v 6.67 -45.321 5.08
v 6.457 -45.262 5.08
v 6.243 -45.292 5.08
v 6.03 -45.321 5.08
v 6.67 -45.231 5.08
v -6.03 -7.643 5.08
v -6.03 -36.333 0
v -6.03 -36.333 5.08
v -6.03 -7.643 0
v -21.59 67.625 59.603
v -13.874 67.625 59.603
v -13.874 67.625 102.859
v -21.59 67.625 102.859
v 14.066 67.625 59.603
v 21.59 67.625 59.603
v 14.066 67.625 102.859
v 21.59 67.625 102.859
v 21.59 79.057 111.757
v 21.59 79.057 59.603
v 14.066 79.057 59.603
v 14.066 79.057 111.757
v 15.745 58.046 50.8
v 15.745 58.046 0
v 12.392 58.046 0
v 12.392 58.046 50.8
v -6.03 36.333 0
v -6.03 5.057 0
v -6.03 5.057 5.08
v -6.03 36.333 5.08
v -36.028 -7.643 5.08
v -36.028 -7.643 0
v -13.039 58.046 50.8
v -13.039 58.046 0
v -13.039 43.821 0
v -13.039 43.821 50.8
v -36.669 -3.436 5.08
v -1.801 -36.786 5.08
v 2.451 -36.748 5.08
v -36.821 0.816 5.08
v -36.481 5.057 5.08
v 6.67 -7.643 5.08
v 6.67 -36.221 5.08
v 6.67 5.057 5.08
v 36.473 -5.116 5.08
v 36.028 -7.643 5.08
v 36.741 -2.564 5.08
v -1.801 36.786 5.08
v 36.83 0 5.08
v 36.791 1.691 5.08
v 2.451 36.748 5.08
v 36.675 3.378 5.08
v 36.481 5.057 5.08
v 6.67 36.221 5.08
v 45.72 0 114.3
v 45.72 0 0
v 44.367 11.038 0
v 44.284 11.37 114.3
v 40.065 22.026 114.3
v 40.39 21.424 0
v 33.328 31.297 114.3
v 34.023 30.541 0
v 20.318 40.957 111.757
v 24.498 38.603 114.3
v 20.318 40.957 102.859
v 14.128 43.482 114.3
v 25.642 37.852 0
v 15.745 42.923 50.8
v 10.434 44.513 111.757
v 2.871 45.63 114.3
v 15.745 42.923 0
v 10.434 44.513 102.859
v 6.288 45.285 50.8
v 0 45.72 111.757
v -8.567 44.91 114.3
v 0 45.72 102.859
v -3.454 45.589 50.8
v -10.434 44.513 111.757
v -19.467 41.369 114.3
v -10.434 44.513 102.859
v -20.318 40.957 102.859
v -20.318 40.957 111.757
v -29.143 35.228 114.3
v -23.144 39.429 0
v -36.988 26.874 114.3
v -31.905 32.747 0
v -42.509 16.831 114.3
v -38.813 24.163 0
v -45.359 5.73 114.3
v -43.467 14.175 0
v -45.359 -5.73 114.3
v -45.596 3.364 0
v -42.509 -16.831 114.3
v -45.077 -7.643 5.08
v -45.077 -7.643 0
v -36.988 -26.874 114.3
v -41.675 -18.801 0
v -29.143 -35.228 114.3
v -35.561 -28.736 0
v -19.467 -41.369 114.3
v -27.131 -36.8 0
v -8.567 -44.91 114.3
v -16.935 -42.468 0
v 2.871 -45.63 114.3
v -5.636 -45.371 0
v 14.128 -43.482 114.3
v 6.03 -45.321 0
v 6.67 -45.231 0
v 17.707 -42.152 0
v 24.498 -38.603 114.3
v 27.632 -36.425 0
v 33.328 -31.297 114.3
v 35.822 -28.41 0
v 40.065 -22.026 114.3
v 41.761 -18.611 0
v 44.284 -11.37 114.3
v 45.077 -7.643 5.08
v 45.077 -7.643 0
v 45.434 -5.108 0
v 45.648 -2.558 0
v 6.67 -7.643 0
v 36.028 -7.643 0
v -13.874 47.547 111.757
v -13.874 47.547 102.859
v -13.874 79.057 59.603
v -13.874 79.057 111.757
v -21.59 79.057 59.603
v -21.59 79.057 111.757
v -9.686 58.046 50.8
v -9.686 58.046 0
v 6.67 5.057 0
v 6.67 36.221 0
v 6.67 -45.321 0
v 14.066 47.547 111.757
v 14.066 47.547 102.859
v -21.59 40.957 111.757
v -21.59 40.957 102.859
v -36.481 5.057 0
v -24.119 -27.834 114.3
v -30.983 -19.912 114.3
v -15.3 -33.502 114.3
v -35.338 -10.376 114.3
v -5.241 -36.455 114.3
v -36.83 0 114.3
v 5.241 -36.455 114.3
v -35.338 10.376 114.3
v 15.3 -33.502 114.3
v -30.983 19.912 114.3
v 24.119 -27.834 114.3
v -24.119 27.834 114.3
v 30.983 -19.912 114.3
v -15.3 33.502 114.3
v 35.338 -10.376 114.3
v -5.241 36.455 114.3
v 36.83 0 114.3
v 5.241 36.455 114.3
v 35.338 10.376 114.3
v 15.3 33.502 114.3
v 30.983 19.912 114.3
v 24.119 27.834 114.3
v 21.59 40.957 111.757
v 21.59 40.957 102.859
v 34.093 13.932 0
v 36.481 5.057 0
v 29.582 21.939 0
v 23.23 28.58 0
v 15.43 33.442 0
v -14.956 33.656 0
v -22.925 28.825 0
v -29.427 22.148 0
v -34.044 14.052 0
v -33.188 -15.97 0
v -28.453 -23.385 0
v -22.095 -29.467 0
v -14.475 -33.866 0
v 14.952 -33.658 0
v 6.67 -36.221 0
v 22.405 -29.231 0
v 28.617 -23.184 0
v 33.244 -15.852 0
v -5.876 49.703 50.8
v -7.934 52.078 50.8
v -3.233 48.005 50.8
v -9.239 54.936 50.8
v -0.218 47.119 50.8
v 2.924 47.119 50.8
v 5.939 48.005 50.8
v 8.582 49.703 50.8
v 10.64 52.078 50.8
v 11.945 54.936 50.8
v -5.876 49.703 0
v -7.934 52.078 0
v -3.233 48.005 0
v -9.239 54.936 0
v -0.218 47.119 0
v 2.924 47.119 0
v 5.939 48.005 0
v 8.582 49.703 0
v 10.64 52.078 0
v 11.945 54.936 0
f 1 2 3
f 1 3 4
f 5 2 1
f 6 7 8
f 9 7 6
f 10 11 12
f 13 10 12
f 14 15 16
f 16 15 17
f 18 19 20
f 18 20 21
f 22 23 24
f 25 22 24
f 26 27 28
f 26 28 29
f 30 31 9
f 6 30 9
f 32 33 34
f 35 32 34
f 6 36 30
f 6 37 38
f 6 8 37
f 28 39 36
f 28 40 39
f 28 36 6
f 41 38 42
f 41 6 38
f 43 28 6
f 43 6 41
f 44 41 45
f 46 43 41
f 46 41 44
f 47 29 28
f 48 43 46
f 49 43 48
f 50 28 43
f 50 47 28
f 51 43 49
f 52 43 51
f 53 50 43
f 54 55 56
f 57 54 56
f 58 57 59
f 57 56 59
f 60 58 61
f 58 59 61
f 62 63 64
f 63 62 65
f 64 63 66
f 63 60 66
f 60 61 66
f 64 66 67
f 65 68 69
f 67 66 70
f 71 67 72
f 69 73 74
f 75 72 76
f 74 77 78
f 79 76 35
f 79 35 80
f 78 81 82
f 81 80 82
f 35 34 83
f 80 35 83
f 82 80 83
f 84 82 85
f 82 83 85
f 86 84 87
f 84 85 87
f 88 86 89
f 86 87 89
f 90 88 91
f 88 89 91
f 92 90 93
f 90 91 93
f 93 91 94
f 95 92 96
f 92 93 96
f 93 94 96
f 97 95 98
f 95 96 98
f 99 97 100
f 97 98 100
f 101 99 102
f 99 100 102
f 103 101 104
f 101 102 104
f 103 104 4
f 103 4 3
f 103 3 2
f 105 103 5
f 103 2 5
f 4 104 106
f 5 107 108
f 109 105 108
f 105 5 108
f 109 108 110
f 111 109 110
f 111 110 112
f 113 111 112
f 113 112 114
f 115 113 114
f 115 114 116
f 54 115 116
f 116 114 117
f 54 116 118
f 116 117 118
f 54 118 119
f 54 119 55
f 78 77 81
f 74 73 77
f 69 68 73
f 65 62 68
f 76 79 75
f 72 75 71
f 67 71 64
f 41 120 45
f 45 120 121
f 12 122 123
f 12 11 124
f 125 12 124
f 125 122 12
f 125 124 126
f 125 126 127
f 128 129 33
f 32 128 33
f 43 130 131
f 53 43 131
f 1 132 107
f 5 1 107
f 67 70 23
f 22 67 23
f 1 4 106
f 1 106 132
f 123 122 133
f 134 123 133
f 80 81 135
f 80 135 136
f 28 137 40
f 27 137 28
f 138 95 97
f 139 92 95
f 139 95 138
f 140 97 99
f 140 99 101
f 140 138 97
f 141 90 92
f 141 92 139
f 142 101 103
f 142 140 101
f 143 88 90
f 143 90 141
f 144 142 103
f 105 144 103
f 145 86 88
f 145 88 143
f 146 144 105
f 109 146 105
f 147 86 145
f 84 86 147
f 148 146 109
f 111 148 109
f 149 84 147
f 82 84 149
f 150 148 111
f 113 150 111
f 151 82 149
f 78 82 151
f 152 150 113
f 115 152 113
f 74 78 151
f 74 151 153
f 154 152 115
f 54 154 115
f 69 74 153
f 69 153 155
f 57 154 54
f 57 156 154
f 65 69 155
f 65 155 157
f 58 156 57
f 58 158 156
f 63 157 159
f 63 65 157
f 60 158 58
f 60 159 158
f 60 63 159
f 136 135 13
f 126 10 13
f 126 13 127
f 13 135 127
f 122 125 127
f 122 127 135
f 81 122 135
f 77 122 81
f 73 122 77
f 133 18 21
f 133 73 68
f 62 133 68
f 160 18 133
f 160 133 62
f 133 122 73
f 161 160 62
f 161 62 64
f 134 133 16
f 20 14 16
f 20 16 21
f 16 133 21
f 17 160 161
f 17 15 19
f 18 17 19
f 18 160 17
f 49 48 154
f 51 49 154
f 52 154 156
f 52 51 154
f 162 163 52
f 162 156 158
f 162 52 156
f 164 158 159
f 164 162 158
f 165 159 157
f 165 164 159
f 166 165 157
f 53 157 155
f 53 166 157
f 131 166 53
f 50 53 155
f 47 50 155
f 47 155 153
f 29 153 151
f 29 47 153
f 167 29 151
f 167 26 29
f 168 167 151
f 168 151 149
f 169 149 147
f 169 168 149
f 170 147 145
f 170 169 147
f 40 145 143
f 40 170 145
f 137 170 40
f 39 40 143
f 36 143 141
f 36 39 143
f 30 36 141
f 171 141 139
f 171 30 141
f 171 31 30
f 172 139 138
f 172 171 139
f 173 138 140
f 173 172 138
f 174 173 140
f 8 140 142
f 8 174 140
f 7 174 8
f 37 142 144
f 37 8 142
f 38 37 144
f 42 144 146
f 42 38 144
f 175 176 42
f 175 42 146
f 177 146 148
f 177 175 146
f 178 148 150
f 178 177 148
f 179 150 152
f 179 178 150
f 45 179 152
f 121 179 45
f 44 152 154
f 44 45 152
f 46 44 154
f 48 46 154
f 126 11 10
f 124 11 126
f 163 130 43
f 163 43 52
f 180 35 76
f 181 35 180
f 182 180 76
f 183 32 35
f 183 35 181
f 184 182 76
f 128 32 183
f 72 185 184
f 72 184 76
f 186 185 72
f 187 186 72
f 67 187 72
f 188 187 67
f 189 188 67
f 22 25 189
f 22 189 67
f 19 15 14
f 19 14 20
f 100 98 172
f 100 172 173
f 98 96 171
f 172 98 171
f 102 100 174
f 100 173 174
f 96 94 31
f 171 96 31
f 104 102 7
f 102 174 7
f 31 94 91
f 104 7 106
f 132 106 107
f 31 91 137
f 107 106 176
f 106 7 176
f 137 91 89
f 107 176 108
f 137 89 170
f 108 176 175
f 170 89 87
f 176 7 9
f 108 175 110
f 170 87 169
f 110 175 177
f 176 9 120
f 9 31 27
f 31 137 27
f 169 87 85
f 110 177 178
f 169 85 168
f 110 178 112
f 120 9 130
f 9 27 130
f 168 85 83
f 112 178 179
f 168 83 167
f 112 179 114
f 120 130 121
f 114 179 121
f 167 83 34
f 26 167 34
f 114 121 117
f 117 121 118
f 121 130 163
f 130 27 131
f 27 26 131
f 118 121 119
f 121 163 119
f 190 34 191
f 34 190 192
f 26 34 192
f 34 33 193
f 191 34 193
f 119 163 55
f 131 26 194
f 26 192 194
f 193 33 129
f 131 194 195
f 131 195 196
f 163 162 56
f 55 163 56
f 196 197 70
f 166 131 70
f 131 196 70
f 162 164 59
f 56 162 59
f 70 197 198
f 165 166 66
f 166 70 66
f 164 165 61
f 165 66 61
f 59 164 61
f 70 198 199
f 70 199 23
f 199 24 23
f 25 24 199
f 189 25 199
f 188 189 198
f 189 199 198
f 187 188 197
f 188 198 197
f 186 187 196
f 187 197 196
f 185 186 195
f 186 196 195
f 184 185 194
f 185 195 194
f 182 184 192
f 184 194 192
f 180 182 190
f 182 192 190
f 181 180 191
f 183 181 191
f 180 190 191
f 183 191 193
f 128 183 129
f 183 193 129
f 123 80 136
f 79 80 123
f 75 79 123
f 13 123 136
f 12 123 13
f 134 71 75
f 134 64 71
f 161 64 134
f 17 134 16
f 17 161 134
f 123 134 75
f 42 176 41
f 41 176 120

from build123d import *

# Parameters (mm, degrees)
F0_R      = 45.72
F2_DEPTH  = 114.3
F1_R      = 36.83
F3_DEPTH  = 114.3
F4_W      = 90.153438
F4_H      = 12.7
F5_DEPTH  = 5.08
F6_W      = 12.7
F6_H      = 90.641294
F7_DEPTH  = 5.08
F8_W      = 11.431906
F8_H      = 43.256522
F9_DEPTH  = 21.59
F11_DEPTH = 50.8
F12_W     = 27.94
F12_H     = 31.50979
F13_DEPTH = 55.88


with BuildPart() as f2:
    # F0 (on Top) → F2 (new body)
    with BuildSketch(Plane.XY):
        Circle(F0_R)
    extrude(amount=F2_DEPTH)

    # F1 (on Top) → F3 (cut)
    with BuildSketch(Plane.XY):
        Circle(F1_R)
    extrude(amount=F3_DEPTH, mode=Mode.SUBTRACT)

    # F4 (on Top) → F5 (join)
    with BuildSketch(Plane.XY):
        with Locations((0, -1.292501)):
            Rectangle(F4_W, F4_H)
    extrude(amount=F5_DEPTH)

    # F6 (on Top) → F7 (join)
    with BuildSketch(Plane.XY):
        with Locations((0.320298, 0)):
            Rectangle(F6_W, F6_H)
    extrude(amount=F7_DEPTH)

    # F8 (on Right) → F9 (join, symmetric)
    with BuildSketch(Plane.YZ):
        Polygon((79.057269, 111.757322), (40.957269, 111.757322), (40.957269, 102.859358), (67.625363, 102.859358), (79.057269, 102.859358), align=None)
        with Locations((73.341316, 81.231097)):
            Rectangle(F8_W, F8_H)
    extrude(amount=F9_DEPTH, both=True)

    # F10 (on Top) → F11 (join)
    with BuildSketch(Plane.XY):
        with BuildLine():
            Line((-13.038913, 40.473972), (15.744843, 40.473972))
            Line((15.744843, 40.473972), (15.744843, 58.045961))
            Line((15.744843, 58.045961), (12.391999, 58.045961))
            ThreePointArc((12.391999, 58.045961), (1.352965, 47.006926), (-9.68607, 58.045961))
            Line((-9.68607, 58.045961), (-13.038913, 58.045961))
            Line((-13.038913, 58.045961), (-13.038913, 40.473972))
        make_face()
    extrude(amount=F11_DEPTH)

    # F12 (on face) → F13 (cut)
    with BuildSketch(Plane.XY.offset(111.757322)):
        with Locations((0.096068, 63.302374)):
            Rectangle(F12_W, F12_H)
    extrude(amount=-F13_DEPTH, mode=Mode.SUBTRACT)


solid = f2.part
